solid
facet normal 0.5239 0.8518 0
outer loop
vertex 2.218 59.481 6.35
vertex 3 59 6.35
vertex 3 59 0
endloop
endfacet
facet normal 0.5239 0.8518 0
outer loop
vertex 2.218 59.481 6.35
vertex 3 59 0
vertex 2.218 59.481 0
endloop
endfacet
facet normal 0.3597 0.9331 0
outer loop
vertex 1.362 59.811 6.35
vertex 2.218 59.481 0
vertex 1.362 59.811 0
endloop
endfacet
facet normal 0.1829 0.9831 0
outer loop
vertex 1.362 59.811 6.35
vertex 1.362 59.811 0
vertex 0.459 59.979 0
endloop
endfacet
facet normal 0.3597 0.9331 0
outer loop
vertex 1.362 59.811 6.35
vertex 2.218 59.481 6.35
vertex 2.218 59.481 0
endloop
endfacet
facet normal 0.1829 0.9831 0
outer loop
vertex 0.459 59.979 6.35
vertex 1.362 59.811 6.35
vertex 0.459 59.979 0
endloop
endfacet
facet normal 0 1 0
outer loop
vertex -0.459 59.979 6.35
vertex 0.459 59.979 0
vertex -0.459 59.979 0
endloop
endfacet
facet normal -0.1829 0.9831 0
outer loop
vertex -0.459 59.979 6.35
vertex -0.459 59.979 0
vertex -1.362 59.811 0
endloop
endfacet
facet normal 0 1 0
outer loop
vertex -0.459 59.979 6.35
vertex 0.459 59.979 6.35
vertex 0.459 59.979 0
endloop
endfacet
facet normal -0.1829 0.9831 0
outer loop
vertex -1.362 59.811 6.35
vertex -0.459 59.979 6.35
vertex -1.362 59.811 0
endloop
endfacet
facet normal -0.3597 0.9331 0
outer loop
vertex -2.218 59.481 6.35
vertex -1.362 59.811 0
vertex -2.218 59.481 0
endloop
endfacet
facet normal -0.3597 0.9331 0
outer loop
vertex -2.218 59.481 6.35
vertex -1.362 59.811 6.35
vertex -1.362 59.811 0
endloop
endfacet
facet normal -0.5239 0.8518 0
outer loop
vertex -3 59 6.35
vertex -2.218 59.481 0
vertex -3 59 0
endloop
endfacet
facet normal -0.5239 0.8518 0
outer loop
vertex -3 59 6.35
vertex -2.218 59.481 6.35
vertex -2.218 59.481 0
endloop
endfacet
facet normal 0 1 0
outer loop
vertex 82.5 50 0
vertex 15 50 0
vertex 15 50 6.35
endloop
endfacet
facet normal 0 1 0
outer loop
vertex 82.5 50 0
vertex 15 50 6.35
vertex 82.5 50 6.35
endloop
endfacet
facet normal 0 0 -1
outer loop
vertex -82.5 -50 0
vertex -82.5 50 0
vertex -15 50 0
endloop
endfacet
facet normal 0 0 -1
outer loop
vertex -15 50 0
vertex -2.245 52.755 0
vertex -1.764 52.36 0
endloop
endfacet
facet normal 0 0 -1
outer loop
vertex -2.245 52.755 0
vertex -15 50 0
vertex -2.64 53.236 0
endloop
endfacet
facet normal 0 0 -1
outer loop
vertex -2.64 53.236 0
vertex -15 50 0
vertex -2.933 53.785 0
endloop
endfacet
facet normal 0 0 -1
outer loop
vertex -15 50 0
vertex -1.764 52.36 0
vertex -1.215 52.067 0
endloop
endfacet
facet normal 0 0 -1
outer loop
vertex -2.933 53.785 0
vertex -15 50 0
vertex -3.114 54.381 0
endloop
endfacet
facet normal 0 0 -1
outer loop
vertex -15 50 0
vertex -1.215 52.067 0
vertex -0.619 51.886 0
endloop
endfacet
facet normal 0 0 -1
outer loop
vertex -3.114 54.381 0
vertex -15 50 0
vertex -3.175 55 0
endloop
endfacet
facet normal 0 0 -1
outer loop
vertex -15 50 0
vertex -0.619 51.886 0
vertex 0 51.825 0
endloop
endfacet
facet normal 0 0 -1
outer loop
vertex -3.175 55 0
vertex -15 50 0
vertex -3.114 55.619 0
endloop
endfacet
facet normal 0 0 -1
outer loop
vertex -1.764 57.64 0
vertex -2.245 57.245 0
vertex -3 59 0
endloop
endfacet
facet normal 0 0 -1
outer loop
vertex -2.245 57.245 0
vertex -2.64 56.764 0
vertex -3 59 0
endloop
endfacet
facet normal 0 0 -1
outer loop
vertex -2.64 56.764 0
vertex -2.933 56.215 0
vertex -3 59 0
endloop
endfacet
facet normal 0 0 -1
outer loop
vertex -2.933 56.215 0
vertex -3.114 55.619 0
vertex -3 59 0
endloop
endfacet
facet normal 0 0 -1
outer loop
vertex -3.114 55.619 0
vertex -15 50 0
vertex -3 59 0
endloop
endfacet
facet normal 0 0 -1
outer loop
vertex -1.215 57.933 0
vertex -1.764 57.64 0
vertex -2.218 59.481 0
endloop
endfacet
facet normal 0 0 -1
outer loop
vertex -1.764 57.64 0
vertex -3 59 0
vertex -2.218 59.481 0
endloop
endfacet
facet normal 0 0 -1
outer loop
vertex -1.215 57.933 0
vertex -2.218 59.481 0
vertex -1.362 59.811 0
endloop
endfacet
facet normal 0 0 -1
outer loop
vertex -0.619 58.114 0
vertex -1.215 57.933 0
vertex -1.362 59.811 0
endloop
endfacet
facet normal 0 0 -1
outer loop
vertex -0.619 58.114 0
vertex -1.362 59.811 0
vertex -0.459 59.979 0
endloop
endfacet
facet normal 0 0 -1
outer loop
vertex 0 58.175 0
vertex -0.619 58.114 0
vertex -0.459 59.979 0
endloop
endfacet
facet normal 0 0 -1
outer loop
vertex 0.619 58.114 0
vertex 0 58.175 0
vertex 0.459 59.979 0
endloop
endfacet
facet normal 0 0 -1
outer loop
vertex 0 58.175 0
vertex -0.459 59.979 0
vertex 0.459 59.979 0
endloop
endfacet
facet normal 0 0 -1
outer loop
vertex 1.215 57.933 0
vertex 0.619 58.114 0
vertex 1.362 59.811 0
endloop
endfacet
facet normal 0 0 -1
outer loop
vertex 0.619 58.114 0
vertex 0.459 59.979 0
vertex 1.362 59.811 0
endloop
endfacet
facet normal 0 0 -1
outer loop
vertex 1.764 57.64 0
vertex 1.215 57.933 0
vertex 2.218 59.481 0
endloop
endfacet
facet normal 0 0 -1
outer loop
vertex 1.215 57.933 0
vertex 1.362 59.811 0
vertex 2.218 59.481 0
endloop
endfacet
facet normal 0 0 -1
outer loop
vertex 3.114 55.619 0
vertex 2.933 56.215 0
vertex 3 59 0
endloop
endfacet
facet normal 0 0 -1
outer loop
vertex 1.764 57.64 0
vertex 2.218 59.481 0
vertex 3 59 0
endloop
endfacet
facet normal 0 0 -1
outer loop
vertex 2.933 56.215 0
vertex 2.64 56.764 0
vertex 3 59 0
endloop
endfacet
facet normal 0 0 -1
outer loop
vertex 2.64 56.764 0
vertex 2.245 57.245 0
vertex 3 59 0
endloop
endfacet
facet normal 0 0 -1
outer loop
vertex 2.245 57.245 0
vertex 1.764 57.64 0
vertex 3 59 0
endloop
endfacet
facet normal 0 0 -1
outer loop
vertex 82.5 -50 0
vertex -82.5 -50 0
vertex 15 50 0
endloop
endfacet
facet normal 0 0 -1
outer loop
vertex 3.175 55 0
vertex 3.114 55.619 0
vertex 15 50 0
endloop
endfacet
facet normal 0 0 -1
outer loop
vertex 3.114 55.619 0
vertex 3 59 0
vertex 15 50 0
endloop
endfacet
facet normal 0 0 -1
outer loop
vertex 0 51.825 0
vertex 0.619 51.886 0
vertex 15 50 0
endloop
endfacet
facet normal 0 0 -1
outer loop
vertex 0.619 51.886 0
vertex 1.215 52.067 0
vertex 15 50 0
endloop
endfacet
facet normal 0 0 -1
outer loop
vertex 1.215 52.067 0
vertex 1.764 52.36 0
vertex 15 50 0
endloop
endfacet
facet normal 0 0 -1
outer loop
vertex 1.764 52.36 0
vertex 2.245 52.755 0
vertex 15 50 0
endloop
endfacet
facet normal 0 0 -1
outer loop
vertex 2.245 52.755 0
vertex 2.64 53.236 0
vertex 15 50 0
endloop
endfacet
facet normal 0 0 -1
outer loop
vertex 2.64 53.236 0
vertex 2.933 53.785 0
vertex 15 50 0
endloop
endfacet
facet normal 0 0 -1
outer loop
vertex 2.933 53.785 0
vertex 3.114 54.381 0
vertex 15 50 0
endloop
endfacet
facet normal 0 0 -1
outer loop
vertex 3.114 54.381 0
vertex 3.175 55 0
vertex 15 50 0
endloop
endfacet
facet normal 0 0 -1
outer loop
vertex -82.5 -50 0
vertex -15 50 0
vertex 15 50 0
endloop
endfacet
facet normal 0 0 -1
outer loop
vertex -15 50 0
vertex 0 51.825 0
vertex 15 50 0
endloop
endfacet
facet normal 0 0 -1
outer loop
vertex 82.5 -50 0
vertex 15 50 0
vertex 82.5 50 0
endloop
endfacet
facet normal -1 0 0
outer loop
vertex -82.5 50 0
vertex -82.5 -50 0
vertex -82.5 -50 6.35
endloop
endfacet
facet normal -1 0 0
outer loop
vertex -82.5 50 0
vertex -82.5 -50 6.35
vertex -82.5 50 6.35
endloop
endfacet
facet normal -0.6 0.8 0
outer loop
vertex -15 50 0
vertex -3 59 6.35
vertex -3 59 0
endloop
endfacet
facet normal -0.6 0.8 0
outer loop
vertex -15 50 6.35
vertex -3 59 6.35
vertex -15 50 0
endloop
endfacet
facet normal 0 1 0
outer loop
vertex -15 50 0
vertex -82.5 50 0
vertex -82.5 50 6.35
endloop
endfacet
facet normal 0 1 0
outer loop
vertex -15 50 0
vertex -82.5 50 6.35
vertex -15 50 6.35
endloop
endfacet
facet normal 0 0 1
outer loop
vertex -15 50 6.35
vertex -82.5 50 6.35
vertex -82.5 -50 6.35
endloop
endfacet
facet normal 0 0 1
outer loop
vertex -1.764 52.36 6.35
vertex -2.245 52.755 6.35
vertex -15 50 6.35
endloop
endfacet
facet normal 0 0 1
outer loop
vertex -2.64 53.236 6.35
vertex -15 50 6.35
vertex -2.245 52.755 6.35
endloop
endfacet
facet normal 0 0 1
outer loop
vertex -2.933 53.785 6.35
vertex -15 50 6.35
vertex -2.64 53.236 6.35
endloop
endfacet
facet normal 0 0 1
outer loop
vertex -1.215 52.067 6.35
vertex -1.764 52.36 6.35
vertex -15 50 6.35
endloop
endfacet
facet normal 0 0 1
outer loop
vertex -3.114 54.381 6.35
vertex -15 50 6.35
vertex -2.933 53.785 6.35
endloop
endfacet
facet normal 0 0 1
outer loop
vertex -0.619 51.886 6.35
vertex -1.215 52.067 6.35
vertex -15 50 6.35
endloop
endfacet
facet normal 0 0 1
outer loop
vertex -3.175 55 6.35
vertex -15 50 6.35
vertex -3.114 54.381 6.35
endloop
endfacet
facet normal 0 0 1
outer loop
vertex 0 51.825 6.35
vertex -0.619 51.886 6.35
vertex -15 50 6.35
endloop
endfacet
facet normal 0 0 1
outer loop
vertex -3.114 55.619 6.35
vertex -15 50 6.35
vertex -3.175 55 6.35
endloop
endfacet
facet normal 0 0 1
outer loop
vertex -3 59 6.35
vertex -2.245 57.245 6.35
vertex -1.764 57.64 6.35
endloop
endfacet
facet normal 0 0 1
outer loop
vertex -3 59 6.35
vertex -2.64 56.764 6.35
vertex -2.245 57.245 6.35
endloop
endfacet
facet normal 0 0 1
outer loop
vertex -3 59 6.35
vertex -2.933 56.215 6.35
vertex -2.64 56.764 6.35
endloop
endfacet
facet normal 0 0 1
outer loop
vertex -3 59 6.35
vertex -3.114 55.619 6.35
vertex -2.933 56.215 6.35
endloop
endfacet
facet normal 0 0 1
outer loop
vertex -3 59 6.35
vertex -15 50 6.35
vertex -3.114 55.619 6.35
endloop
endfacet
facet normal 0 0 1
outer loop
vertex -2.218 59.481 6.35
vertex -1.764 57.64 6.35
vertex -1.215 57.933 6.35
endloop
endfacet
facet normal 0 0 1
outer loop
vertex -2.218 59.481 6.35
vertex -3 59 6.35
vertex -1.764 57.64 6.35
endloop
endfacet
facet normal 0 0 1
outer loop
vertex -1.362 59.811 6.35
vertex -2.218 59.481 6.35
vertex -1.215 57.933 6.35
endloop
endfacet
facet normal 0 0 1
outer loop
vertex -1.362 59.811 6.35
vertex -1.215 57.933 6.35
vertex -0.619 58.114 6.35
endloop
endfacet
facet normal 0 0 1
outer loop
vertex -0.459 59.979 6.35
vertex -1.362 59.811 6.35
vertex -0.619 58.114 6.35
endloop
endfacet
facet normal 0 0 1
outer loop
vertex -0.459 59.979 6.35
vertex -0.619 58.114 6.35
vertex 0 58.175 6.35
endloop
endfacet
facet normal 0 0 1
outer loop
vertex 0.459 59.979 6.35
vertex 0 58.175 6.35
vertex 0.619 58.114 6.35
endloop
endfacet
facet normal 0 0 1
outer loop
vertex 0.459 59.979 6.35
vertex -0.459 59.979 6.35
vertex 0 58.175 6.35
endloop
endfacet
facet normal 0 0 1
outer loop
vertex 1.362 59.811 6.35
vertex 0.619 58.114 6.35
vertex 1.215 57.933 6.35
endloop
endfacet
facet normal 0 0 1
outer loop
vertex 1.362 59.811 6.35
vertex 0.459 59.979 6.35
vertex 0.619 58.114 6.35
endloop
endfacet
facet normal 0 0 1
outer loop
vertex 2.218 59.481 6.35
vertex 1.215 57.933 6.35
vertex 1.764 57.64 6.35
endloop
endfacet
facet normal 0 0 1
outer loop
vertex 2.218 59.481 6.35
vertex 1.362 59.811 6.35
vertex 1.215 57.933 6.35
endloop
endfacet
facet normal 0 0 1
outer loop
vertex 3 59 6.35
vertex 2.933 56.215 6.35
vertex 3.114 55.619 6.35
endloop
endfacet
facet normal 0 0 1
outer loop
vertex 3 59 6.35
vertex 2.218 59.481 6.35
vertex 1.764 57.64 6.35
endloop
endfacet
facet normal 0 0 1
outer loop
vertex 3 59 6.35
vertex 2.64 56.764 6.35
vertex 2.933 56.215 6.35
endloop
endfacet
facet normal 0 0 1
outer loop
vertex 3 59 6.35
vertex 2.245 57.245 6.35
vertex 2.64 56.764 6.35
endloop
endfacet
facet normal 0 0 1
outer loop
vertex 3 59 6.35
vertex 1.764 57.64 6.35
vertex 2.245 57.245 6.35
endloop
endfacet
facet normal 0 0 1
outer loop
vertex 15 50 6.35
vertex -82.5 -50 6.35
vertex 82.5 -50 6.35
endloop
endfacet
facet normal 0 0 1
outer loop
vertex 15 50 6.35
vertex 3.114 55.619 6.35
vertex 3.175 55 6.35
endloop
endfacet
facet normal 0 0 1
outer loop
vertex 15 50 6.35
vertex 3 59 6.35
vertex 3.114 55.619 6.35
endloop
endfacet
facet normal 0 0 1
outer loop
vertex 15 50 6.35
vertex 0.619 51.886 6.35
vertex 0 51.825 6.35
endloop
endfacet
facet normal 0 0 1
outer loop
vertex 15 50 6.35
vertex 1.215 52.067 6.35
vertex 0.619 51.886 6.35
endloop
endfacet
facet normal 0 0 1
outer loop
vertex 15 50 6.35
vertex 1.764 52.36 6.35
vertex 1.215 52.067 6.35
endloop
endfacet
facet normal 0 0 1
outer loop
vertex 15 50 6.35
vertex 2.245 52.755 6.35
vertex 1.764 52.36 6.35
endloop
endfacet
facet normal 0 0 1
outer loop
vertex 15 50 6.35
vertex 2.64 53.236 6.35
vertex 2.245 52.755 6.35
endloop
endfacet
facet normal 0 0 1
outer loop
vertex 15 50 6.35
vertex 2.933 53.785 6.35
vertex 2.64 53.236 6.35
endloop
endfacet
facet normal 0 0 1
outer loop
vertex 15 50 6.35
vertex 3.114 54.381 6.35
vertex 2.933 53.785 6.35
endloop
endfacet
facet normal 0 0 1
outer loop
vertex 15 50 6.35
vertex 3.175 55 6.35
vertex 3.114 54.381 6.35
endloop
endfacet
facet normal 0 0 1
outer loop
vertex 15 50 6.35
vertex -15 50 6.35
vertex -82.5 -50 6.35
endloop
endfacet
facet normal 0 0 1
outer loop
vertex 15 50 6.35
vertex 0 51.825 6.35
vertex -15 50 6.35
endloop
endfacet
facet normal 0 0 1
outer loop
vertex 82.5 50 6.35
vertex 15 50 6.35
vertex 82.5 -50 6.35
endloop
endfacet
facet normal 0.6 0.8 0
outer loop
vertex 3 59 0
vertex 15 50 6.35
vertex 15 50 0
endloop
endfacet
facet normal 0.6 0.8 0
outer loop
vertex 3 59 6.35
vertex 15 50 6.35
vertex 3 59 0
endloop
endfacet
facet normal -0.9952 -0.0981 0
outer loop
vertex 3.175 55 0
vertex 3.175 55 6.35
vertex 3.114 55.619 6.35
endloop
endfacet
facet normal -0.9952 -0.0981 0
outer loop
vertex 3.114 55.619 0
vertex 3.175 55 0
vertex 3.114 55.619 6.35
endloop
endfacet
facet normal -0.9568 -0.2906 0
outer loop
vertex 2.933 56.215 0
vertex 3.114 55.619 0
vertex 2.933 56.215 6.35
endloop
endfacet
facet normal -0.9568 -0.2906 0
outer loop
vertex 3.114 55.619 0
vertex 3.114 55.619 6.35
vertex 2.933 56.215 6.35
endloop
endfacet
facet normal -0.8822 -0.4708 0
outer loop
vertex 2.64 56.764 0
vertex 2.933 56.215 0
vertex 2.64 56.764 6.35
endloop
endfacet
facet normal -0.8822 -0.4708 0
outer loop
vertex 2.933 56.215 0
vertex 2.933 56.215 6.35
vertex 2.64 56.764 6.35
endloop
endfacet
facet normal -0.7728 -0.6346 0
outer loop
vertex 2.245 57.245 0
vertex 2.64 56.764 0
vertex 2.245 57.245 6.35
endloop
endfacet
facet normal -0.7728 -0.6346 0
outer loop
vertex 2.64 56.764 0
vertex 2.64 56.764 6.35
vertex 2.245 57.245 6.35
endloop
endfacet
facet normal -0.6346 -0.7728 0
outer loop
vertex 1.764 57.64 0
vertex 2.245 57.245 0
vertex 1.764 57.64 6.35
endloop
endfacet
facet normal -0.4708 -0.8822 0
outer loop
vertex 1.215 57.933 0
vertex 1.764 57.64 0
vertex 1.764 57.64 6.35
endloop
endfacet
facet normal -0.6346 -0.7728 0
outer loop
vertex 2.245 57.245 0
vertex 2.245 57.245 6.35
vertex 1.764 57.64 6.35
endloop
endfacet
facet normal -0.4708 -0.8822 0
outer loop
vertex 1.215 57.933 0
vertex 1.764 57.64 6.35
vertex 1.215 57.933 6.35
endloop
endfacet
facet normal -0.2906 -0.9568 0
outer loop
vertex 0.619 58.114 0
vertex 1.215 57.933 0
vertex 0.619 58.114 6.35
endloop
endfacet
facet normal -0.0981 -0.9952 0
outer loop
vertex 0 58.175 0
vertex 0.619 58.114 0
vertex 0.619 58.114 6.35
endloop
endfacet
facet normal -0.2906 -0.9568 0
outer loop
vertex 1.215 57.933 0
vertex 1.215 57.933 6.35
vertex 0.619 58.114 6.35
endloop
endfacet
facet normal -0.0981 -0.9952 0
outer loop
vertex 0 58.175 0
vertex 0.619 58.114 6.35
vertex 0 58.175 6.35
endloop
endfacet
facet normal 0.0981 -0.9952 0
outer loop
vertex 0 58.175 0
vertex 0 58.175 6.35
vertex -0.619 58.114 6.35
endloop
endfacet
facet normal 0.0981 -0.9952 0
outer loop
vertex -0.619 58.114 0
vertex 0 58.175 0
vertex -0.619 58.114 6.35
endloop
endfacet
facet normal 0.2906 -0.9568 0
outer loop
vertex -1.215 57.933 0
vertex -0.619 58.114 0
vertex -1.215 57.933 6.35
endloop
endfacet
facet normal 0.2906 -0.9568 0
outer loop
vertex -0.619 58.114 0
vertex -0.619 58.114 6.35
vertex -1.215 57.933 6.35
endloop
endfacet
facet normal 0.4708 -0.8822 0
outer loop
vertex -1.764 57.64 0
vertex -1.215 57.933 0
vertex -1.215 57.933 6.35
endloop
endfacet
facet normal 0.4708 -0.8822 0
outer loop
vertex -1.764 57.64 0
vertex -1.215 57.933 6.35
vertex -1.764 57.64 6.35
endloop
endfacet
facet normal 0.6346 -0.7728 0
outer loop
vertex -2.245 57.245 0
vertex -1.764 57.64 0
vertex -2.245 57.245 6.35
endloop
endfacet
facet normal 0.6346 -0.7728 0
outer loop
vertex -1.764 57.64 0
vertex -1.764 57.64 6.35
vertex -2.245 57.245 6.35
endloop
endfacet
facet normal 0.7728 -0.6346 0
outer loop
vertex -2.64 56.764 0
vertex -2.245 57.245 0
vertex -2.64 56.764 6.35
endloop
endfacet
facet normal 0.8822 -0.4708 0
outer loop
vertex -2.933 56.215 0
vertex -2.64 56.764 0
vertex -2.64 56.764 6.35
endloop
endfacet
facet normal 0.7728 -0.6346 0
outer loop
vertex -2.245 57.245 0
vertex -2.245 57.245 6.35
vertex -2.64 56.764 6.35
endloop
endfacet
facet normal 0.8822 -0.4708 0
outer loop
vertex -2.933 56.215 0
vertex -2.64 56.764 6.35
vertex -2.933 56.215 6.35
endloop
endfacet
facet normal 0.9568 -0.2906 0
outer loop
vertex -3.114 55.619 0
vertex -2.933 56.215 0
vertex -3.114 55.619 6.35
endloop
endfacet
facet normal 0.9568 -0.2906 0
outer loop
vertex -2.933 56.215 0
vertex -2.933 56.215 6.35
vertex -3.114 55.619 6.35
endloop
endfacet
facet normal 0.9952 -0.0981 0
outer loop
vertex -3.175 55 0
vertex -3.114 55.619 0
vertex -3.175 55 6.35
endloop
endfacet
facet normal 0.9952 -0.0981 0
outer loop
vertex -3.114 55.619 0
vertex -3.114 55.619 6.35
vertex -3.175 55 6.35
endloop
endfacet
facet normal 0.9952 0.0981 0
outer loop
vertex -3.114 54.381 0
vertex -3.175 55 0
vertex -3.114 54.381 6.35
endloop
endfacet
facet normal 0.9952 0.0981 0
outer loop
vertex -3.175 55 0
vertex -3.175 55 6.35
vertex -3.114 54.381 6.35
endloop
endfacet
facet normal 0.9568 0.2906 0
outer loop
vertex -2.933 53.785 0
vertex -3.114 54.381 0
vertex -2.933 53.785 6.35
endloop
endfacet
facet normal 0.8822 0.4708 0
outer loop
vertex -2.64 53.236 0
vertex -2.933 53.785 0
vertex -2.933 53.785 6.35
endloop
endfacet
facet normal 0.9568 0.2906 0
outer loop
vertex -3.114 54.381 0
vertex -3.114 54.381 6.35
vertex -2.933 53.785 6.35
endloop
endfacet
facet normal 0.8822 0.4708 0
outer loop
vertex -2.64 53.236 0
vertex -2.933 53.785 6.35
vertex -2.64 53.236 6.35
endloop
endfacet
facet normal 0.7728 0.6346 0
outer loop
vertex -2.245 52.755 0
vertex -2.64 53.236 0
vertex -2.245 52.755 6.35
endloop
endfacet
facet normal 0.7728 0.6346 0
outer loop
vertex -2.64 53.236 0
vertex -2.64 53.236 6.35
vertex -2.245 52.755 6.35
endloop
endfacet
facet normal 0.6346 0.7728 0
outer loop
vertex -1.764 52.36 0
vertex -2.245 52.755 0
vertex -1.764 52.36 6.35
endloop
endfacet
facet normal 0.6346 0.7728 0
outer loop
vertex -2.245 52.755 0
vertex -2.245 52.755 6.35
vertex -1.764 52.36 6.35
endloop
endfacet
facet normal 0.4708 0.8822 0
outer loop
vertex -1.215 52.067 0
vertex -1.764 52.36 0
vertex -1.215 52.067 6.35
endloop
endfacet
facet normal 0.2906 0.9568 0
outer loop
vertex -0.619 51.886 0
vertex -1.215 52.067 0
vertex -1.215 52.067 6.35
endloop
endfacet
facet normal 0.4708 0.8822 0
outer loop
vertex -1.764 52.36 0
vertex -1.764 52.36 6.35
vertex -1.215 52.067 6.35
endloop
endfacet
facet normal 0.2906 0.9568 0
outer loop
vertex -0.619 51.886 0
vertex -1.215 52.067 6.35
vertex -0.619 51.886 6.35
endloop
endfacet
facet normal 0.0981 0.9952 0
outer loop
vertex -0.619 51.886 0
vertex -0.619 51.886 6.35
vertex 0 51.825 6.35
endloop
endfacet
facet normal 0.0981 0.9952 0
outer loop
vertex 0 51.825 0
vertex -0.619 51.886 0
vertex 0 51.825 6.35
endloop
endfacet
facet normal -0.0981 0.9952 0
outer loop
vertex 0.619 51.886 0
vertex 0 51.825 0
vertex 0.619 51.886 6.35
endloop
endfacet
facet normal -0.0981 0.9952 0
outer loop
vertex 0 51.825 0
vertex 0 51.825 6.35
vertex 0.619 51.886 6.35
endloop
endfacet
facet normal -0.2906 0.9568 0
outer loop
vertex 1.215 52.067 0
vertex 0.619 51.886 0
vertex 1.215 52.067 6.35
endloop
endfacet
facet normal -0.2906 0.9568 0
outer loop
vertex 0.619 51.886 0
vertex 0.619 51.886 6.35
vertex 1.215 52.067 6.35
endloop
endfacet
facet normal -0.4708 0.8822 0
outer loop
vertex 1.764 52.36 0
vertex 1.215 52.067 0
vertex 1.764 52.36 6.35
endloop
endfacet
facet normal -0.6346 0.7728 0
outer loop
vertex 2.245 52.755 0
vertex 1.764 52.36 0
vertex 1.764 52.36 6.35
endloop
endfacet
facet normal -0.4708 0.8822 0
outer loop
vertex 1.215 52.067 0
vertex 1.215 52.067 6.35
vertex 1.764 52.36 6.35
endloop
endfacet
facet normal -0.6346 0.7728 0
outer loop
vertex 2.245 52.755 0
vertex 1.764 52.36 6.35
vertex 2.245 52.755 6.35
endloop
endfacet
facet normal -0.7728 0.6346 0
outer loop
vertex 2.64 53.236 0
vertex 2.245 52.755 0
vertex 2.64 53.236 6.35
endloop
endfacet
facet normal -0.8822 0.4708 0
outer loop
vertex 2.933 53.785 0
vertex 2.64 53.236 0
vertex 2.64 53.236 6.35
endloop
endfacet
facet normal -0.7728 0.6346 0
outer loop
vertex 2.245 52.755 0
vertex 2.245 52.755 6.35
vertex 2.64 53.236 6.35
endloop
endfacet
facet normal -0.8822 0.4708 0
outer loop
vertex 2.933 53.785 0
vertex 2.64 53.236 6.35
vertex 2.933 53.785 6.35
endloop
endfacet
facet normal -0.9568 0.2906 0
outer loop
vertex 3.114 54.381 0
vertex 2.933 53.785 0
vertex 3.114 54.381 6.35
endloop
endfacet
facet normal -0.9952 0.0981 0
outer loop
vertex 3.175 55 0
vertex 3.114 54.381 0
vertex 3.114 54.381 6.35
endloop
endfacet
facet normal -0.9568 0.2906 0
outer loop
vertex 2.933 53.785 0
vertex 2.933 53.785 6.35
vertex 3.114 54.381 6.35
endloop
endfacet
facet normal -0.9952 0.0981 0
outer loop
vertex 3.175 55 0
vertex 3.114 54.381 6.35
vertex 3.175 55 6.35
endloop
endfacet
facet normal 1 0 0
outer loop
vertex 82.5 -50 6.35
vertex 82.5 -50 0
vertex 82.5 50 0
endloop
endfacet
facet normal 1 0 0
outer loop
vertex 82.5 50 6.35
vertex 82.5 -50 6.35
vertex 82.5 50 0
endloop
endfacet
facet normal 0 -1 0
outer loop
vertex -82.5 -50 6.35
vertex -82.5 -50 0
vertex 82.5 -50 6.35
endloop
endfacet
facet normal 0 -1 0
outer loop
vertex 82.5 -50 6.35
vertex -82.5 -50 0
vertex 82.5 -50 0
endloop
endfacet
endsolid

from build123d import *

# Parameters (mm, degrees)
SKETCH1_W           = 165
SKETCH1_H           = 100
BOSS_EXTRUDE1_DEPTH = 6.35
SKETCH2_R           = 3.175
BOSS_EXTRUDE2_DEPTH = 6.35


with BuildPart() as part:
    # Sketch1 → Boss-Extrude1 (new body)
    with BuildSketch(Plane.XY):
        Rectangle(SKETCH1_W, SKETCH1_H)
    extrude(amount=BOSS_EXTRUDE1_DEPTH)

    # Sketch2 → Boss-Extrude2 (add)
    with BuildSketch(Plane.XY.offset(6.35)):
        with BuildLine():
            Line((-3, 59), (-15, 50))
            Line((-15, 50), (15, 50))
            Line((15, 50), (3, 59))
            ThreePointArc((3, 59), (0, 60), (-3, 59))
        make_face()
        with Locations((0, 55)):
            Circle(SKETCH2_R, mode=Mode.SUBTRACT)
    extrude(amount=-BOSS_EXTRUDE2_DEPTH)


solid = part.part
